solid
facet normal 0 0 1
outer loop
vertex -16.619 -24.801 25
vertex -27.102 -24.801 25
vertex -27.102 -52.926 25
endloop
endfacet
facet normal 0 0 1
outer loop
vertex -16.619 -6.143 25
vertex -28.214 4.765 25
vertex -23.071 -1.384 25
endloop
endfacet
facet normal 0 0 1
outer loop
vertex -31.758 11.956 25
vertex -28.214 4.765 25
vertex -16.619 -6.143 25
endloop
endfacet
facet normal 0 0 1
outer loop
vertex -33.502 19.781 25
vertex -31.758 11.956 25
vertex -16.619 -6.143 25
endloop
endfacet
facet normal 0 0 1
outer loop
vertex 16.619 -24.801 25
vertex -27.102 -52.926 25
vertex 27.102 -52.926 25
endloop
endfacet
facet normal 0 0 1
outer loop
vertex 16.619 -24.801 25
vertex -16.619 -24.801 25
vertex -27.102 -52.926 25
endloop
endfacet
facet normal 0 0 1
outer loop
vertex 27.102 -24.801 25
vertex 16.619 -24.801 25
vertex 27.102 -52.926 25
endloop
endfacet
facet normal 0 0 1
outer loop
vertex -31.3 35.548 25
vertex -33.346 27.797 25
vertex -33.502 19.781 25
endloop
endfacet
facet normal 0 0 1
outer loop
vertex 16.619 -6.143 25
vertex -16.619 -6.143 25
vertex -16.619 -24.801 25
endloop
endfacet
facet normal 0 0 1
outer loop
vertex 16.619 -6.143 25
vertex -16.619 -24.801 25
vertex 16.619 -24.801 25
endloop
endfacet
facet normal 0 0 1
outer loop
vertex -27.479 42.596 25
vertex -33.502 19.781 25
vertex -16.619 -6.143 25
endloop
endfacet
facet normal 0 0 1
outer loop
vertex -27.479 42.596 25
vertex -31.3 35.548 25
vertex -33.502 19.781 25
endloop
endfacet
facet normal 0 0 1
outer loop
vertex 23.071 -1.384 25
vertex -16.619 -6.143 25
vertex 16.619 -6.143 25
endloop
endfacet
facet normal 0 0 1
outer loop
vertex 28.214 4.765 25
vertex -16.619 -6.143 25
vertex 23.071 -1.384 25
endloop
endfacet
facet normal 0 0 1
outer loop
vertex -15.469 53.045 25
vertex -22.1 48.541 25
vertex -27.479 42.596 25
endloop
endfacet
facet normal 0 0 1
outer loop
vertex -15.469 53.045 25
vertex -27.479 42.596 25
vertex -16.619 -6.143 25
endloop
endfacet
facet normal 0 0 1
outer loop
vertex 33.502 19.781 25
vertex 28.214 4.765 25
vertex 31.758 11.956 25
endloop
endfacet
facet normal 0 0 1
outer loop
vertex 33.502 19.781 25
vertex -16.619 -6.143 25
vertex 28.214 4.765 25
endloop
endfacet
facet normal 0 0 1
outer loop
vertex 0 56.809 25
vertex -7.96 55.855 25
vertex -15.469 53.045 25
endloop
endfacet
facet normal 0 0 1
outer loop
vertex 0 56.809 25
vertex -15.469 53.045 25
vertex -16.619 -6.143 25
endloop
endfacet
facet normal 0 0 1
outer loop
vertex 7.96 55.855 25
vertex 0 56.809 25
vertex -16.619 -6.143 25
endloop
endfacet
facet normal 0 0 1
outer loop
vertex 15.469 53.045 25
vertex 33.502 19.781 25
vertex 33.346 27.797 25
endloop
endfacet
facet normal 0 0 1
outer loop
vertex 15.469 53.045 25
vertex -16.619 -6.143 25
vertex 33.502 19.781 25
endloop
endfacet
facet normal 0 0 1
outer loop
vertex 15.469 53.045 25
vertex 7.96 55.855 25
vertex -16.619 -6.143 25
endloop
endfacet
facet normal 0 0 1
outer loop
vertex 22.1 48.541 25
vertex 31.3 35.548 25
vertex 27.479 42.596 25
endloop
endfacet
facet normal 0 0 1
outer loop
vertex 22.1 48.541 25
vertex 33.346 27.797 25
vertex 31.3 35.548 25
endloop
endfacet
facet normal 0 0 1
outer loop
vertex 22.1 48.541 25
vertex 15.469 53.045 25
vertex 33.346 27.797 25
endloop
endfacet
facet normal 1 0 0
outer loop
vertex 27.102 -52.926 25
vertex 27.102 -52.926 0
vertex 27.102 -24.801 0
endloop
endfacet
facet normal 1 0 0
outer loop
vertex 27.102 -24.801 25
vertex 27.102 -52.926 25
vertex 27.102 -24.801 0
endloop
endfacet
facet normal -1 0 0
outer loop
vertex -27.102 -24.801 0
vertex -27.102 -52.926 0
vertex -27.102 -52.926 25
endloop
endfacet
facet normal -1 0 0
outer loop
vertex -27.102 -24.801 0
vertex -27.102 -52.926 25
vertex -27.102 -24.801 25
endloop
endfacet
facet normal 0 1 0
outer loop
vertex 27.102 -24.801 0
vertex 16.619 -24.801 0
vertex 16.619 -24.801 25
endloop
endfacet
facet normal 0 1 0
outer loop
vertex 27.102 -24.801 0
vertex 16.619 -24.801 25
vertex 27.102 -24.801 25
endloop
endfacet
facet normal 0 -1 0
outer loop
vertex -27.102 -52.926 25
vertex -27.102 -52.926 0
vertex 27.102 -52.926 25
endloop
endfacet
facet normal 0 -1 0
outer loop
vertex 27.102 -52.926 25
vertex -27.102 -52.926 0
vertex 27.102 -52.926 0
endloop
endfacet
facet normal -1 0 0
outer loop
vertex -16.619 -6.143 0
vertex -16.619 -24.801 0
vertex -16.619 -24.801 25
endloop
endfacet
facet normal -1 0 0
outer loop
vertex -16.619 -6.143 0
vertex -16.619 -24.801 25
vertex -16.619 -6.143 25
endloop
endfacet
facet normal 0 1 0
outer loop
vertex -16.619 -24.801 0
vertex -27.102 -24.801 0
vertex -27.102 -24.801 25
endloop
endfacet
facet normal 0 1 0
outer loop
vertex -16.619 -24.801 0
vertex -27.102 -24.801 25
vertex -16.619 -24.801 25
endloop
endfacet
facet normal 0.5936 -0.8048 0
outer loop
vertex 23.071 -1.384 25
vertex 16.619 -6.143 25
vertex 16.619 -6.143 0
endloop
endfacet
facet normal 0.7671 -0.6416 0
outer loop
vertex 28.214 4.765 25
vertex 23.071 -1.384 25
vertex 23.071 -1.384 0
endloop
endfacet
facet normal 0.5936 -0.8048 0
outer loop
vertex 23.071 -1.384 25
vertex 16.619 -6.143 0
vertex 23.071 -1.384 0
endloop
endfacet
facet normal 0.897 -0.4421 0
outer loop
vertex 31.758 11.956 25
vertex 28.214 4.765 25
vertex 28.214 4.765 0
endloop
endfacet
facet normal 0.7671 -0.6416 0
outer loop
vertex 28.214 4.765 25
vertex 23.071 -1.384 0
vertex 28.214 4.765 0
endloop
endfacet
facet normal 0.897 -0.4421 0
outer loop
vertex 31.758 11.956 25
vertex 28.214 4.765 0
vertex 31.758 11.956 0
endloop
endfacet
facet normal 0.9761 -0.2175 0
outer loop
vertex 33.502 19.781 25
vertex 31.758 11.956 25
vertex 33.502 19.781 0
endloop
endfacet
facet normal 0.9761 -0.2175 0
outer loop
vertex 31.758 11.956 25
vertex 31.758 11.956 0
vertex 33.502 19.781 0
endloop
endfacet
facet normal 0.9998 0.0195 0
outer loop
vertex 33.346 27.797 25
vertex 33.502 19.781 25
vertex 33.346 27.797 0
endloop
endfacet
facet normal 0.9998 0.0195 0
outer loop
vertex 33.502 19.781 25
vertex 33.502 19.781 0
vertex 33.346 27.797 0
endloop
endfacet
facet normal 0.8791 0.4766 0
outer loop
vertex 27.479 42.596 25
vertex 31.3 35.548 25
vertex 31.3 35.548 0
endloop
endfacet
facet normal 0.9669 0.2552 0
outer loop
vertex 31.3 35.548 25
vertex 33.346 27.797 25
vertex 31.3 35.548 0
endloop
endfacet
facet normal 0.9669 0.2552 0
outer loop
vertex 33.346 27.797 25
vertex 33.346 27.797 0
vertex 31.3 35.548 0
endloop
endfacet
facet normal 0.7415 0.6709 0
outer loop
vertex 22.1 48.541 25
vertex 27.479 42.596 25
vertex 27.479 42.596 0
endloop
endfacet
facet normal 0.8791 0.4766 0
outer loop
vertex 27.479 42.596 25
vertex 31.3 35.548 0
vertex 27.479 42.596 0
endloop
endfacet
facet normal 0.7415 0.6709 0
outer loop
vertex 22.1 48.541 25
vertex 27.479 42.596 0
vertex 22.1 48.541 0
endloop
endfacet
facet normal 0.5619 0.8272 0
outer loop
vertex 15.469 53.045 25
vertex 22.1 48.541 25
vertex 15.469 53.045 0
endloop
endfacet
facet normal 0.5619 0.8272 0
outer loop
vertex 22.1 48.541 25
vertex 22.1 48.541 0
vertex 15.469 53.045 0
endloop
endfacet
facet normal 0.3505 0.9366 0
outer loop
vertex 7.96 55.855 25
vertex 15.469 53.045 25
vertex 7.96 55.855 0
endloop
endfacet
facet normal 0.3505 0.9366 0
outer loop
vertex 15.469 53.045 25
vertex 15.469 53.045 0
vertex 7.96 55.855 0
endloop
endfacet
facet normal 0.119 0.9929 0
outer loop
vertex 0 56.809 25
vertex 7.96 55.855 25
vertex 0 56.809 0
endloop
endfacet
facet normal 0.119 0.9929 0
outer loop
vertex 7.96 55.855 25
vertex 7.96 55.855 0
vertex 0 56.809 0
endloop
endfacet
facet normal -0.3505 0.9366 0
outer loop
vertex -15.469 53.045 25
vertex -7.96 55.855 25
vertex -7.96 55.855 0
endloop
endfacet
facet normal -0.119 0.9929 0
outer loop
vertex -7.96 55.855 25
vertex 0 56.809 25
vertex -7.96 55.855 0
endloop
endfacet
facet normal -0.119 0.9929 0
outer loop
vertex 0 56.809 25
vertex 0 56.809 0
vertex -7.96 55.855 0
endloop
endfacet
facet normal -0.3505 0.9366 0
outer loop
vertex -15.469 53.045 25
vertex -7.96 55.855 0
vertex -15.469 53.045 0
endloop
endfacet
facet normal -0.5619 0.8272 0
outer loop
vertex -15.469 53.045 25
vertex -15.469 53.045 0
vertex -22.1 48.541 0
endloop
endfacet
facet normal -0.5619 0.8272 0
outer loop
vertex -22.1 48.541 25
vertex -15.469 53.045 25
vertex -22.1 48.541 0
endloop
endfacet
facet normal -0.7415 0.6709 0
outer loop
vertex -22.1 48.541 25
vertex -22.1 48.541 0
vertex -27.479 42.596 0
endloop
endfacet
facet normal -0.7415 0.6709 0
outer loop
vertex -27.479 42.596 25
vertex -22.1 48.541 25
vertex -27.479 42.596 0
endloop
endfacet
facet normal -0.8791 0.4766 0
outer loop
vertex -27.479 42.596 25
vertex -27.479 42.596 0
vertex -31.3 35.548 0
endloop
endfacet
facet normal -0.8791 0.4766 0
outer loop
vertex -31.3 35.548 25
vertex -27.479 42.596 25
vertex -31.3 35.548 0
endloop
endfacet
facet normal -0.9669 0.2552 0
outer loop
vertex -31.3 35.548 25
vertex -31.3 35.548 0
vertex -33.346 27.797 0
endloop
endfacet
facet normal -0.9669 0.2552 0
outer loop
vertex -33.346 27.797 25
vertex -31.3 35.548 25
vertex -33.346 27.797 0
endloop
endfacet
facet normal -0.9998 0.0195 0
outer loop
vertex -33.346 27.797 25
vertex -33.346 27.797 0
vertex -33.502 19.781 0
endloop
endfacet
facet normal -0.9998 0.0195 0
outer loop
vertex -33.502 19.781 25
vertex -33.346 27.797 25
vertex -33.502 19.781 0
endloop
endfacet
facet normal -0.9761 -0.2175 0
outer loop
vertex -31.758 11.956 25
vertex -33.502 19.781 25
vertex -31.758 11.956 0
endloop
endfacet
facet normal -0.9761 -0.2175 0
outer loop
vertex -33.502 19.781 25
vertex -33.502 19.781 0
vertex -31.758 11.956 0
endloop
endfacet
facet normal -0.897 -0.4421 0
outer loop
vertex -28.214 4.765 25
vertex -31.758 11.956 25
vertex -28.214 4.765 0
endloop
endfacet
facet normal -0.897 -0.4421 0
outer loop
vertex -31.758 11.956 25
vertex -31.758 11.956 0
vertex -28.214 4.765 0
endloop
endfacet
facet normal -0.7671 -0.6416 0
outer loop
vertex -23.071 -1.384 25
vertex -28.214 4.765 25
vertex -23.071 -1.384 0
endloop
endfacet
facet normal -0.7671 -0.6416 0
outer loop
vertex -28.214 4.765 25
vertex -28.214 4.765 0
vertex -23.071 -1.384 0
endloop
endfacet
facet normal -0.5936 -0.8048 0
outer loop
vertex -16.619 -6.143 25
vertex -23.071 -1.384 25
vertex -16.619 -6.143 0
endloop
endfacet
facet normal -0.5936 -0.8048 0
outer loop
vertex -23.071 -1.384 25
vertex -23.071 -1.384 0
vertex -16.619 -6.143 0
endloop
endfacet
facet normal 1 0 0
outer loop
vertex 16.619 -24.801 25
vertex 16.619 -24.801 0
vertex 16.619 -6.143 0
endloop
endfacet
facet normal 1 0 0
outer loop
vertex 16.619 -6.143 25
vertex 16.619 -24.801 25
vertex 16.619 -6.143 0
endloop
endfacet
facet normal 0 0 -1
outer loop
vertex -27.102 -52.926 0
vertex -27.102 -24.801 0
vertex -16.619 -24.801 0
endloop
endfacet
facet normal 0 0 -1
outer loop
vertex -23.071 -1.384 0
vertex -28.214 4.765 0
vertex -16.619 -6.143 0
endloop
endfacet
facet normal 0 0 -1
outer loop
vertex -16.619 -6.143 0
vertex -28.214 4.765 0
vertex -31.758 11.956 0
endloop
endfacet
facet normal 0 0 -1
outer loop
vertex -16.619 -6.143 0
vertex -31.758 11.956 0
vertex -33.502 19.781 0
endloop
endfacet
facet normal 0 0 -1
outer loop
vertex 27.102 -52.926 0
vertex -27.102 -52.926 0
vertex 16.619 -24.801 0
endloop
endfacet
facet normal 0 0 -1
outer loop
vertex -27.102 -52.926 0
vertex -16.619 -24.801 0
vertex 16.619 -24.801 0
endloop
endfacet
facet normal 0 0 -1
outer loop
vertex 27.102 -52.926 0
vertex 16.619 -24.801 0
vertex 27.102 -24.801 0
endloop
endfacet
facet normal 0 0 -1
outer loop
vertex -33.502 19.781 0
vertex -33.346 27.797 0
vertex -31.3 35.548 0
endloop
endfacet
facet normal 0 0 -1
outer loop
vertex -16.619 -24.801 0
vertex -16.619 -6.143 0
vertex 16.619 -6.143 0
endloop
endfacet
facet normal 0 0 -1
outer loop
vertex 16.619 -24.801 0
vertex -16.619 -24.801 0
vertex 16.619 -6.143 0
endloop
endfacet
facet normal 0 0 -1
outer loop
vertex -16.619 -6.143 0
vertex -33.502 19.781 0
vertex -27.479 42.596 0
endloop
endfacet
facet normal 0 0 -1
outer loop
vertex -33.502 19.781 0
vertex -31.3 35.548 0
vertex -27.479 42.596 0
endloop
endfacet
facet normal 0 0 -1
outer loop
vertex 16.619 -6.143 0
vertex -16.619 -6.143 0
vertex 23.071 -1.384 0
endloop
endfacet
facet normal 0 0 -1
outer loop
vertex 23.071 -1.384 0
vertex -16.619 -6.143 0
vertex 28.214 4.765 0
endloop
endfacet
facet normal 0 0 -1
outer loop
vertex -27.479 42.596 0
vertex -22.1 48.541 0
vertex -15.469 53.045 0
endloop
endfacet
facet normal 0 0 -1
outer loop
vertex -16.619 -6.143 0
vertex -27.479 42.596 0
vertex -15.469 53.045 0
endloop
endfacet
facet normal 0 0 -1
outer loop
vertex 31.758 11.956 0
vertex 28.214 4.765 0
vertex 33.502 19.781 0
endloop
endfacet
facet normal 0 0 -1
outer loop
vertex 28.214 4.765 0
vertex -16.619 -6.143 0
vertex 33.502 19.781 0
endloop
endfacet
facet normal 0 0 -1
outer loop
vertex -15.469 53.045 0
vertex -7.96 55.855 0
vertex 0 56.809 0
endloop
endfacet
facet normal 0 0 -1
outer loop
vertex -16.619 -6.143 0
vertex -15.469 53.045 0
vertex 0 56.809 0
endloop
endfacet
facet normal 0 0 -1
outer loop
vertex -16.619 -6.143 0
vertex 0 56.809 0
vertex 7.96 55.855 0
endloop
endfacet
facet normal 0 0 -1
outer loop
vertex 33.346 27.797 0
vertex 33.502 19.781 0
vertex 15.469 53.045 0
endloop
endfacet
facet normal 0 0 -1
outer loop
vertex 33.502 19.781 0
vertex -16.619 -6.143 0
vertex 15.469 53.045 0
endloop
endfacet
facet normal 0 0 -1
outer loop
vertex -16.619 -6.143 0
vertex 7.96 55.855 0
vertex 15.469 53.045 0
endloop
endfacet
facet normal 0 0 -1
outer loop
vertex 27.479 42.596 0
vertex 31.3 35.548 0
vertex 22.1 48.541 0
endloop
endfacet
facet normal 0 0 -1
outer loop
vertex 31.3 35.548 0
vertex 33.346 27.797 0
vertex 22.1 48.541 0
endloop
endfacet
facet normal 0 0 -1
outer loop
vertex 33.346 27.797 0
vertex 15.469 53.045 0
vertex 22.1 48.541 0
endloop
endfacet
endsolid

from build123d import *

# Parameters (mm, degrees)
F1_R     = 33.669764
F3_DEPTH = 25
F0_W     = 33.238638
F0_H     = 92.045456
F4_DEPTH = 25
F2_W     = 54.204546
F2_H     = 28.124999
F5_DEPTH = 25


with BuildPart() as f3:
    # F1 (on Top) → F3 (new body)
    with BuildSketch(Plane.XY):
        with Locations((0, 23.139205)):
            Circle(F1_R)
    extrude(amount=F3_DEPTH)

    # F0 (on Top) → F4 (join)
    with BuildSketch(Plane.XY):
        Rectangle(F0_W, F0_H)
    extrude(amount=F4_DEPTH)

    # F2 (on Top) → F5 (join)
    with BuildSketch(Plane.XY):
        with Locations((0, -38.863636)):
            Rectangle(F2_W, F2_H)
    extrude(amount=F5_DEPTH)


solid = f3.part
